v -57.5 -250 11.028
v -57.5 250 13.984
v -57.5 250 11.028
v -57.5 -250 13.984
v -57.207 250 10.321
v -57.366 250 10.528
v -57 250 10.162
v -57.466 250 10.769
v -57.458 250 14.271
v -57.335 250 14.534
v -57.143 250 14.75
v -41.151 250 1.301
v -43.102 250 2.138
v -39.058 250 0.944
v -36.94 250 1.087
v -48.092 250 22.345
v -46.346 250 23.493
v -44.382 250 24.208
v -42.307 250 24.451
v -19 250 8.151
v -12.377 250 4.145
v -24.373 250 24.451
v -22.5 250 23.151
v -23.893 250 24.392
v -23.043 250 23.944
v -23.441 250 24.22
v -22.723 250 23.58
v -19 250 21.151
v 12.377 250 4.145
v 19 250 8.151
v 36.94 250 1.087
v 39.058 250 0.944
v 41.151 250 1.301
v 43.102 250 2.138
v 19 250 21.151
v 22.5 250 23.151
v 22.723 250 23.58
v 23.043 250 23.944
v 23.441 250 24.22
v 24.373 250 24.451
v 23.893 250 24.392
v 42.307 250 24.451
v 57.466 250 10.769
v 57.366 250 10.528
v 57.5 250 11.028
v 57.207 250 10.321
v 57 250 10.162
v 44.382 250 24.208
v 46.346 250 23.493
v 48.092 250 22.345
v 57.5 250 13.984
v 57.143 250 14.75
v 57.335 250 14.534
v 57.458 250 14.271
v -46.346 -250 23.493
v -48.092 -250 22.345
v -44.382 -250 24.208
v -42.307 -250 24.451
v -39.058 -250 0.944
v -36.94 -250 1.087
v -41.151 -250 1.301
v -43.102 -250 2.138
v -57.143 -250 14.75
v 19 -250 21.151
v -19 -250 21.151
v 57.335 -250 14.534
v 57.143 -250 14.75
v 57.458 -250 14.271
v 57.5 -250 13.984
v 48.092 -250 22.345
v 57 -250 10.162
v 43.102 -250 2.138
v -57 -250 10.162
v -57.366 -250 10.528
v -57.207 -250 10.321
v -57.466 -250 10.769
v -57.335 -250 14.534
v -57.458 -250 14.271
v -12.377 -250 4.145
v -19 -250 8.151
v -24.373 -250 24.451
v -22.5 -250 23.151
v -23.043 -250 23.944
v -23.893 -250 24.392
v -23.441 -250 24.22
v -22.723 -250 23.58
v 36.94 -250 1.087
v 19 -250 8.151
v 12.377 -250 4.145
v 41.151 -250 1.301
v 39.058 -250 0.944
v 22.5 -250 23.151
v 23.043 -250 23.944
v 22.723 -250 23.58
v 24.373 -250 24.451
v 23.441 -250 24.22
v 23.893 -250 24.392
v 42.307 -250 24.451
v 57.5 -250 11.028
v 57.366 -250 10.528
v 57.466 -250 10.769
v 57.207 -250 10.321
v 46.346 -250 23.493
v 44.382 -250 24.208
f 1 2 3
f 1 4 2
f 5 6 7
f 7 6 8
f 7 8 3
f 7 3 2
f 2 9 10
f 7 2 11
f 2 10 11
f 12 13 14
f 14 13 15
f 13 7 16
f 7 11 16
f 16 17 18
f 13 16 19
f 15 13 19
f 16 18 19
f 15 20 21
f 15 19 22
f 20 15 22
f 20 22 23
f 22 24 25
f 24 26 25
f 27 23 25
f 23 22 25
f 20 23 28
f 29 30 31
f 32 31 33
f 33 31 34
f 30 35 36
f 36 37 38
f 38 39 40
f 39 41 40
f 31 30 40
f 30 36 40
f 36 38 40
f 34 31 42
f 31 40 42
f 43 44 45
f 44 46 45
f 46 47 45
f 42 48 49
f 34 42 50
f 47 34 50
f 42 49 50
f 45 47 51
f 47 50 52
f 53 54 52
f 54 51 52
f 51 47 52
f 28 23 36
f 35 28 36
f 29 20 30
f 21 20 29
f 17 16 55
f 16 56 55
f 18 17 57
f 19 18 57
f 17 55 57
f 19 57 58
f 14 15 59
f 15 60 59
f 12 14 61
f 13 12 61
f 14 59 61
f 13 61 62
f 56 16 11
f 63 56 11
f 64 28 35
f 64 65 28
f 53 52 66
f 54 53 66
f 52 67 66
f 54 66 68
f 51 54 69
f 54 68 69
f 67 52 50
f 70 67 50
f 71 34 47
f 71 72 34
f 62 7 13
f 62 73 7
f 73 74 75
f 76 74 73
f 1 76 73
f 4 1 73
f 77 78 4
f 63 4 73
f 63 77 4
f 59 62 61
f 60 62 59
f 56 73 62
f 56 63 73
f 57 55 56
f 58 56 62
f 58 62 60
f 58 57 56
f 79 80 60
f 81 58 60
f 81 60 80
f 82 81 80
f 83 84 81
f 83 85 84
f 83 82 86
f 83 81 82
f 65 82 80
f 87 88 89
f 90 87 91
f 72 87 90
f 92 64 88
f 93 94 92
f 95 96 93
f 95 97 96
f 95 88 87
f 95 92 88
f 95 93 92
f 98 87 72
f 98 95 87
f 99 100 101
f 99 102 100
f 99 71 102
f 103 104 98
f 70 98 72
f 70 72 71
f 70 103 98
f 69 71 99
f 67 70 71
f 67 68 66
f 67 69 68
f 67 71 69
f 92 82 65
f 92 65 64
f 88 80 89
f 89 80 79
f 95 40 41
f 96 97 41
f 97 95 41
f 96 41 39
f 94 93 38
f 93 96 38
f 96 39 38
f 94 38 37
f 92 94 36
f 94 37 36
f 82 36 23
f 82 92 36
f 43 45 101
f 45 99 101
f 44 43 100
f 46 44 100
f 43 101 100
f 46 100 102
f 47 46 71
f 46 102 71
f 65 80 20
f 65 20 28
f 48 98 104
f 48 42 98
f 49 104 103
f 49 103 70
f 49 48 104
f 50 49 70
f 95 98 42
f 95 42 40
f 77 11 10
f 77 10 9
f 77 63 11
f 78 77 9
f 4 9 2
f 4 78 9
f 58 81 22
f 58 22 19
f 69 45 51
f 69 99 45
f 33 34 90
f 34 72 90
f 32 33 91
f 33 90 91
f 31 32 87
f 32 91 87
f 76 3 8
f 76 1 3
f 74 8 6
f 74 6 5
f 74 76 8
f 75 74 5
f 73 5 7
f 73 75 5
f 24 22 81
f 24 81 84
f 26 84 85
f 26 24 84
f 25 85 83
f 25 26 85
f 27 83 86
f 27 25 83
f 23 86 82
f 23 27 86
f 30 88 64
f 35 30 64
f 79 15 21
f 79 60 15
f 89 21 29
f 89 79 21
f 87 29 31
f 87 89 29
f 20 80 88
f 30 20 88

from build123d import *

# Parameters (mm, degrees)
F1_DEPTH    = 250
F2_W        = 38
F2_H        = 13
F3_DEPTH    = 250
F4_T1_DEPTH = 509.3674969976
F5_R        = 9
F6_R        = 1


# Not quite as in the source:
# - a fillet or chamfer that OpenCascade refuses, or shapes differently, is made with other operations: its cross-section is extruded or revolved along the edge and cut away or added


with BuildPart() as f1:
    # F0 (on Front) → F1 (new body, symmetric)
    with BuildSketch(Plane.XZ):
        with BuildLine():
            Line((22.5, 23.1507345177), (0, 23.1507345177))
            Line((0, 23.1507345177), (-22.5, 23.1507345177))
            Line((-22.5, 23.1507345177), (-22.5, 24.4507345177))
            Line((-22.5, 24.4507345177), (-45.5824640741, 24.4507345177))
            Line((-45.5824640741, 24.4507345177), (-57.5, 14.4507345177))
            Line((-57.5, 14.4507345177), (-57.5, 10.4507345177))
            Line((-57.5, 10.4507345177), (-40.1794919243, 0.4507345177))
            ThreePointArc((-40.1794919243, 0.4507345177), (0, 4.5282793762), (40.1794919243, 0.4507345177))
            Line((40.1794919243, 0.4507345177), (57.5, 10.4507345177))
            Line((57.5, 10.4507345177), (57.5, 14.4507345177))
            Line((57.5, 14.4507345177), (45.5824640741, 24.4507345177))
            Line((45.5824640741, 24.4507345177), (22.5, 24.4507345177))
            Line((22.5, 24.4507345177), (22.5, 23.1507345177))
        make_face()
    extrude(amount=F1_DEPTH, both=True)

    # F2 (on Front) → F3 (cut, symmetric)
    with BuildSketch(Plane.XZ):
        with Locations((0, 14.6507345177)):
            Rectangle(F2_W, F2_H)
    extrude(amount=F3_DEPTH, both=True, mode=Mode.SUBTRACT)

    # F4: fillet of radius 2 on 2 edges, made by hand

    # F4_s2 → F4_t1 (cut)
    with BuildSketch(Plane.XZ.offset(-254.6837484988)):
        with BuildLine():
            ThreePointArc((-24.3734993995, 24.4507345177), (-23.2333239744, 24.0939021903), (-22.5, 23.1507345177))
            Line((-22.5, 23.1507345177), (-22.5, 24.4507345177))
            Line((-22.5, 24.4507345177), (-24.3734993995, 24.4507345177))
        make_face()
        with BuildLine():
            ThreePointArc((24.3734993995, 24.4507345177), (23.2333239744, 24.0939021903), (22.5, 23.1507345177))
            Line((22.5, 23.1507345177), (22.5, 24.4507345177))
            Line((22.5, 24.4507345177), (24.3734993995, 24.4507345177))
        make_face()
    extrude(amount=F4_T1_DEPTH, mode=Mode.SUBTRACT)

    # F5
    f5_edges = [f1.edges().sort_by_distance(p)[0] for p in [
        (45.582464, 0, 24.450735),
        (40.179492, 0, 0.450735),
        (-45.582464, 0, 24.450735),
        (-40.179492, 0, 0.450735),
    ]]
    fillet(f5_edges, radius=F5_R)

    # F6
    f6_edges = [f1.edges().sort_by_distance(p)[0] for p in [
        (57.5, 0, 14.450735),
        (57.5, 0, 10.450735),
        (-57.5, 0, 14.450735),
        (-57.5, 0, 10.450735),
    ]]
    fillet(f6_edges, radius=F6_R)


solid = f1.part
